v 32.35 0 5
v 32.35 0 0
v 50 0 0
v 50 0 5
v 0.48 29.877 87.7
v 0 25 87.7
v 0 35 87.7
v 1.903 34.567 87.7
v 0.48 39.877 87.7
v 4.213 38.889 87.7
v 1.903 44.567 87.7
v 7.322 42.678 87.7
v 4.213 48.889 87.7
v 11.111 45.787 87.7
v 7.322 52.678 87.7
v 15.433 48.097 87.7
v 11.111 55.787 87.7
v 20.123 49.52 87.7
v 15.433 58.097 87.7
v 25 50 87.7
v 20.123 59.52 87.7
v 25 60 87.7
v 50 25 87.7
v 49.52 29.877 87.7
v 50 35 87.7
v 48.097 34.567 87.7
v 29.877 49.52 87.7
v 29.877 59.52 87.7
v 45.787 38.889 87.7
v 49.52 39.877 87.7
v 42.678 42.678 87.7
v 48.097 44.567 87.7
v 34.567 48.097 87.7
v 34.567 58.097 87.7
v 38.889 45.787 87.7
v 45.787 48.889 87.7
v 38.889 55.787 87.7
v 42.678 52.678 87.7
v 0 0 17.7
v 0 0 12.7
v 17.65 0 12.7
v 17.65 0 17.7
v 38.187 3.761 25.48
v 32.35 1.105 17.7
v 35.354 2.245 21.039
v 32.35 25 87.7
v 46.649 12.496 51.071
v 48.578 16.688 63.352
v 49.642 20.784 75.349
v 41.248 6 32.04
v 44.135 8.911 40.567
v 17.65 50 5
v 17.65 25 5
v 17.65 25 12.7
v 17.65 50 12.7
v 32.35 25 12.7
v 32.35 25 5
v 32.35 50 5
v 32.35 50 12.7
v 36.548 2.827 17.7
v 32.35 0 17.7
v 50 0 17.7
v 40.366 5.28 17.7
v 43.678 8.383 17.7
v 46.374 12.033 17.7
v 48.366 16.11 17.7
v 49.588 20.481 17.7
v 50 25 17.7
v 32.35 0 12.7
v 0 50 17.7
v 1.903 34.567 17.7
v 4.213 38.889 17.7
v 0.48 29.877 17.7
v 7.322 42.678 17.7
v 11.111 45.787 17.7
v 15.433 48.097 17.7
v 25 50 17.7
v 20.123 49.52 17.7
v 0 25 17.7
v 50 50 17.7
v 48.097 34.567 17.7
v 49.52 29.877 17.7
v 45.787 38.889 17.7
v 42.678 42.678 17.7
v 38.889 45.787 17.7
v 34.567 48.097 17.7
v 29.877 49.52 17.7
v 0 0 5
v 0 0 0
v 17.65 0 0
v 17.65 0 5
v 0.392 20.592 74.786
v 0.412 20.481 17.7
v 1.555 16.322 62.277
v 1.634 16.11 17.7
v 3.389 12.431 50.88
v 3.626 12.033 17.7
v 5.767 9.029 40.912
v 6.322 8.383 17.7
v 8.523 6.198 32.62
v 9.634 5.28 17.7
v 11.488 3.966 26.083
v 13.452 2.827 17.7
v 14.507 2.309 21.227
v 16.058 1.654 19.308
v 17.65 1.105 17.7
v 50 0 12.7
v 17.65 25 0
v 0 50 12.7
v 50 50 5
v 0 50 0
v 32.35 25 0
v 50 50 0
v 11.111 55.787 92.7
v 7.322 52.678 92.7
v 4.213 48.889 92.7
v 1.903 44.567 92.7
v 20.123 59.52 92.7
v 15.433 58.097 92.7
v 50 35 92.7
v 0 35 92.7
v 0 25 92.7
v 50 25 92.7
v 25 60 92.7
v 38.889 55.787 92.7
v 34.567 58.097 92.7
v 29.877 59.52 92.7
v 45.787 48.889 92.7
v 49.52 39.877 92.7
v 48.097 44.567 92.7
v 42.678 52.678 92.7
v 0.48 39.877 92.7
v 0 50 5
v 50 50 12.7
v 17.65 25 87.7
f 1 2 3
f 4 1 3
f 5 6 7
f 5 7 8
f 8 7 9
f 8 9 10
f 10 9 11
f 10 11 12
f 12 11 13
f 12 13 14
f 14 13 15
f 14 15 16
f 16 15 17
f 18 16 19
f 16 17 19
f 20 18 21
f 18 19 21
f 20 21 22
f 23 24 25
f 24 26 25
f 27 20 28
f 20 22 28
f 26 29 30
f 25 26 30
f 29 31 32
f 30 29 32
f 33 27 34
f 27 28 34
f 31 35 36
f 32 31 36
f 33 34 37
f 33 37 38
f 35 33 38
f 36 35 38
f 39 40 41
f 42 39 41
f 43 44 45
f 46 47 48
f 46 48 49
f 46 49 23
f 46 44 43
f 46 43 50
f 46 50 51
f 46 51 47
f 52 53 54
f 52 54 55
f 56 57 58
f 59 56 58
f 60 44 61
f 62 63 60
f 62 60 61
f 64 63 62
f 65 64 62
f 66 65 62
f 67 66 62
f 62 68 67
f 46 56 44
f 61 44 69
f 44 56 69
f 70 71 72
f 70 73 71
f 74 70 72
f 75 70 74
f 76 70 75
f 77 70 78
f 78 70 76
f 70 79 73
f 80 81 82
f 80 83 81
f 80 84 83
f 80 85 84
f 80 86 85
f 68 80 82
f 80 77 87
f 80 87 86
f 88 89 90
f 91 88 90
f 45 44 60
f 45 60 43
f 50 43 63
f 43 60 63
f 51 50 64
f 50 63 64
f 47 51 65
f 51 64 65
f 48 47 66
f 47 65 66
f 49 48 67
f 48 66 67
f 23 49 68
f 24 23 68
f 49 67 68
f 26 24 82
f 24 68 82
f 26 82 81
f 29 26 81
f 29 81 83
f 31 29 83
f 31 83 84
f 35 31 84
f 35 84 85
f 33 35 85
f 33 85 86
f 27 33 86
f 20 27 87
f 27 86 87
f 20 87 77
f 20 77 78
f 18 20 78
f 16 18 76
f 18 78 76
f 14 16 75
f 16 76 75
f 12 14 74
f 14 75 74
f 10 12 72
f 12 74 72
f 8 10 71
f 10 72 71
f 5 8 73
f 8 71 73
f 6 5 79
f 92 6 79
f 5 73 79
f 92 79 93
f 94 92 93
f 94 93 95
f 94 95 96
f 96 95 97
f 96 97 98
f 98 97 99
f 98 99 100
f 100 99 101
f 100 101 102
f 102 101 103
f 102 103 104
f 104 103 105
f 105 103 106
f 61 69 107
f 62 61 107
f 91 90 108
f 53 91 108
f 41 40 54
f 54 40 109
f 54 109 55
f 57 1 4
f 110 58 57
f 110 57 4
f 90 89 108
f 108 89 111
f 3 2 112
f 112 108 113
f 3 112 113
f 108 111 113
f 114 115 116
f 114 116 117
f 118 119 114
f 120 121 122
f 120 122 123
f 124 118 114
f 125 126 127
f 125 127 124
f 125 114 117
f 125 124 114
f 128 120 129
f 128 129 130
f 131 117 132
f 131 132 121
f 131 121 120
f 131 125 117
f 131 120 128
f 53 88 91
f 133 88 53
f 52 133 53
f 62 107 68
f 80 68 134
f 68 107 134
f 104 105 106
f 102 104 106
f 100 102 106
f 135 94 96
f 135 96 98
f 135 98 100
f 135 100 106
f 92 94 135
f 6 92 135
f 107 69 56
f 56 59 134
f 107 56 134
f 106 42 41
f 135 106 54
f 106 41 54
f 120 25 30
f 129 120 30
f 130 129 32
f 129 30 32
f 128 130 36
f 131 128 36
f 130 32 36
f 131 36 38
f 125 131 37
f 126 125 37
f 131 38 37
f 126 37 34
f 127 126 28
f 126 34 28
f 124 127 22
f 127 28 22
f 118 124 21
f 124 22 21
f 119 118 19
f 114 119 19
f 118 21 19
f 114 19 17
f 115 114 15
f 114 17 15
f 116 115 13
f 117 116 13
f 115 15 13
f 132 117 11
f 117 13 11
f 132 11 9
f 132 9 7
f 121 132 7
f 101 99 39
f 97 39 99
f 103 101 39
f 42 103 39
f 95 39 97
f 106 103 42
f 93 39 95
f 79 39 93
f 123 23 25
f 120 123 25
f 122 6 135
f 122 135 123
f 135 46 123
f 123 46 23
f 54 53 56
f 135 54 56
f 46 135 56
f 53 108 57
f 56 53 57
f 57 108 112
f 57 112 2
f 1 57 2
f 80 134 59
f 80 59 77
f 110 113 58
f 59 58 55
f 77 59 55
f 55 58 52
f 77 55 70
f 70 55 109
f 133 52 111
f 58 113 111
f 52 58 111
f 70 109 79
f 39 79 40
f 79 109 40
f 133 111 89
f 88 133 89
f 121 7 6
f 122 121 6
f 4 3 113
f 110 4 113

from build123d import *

# Parameters (mm, degrees)
F2_DEPTH  = 5
F3_W      = 14.7
F3_H      = 25
F4_DEPTH  = 7.7
F6_DEPTH  = 5
F8_DEPTH  = 70
F10_DEPTH = 5
F12_DEPTH = 50.001


with BuildPart() as f2:
    # F1 (on Top) → F2 (new body)
    with BuildSketch(Plane.XY):
        Polygon((0, 50), (0, 0), (17.65, 0), (17.65, 25), (32.35, 25), (32.35, 0), (50, 0), (50, 50), align=None)
    extrude(amount=F2_DEPTH)

    # F3 (on face) → F4 (join)
    with BuildSketch(Plane.XY.offset(5)):
        with Locations((25, 37.5)):
            Rectangle(F3_W, F3_H)
    extrude(amount=F4_DEPTH)

    # F5 (on face) → F6 (join)
    with BuildSketch(Plane.XY.offset(12.7)):
        Polygon((0, 50), (0, 0), (17.65, 0), (17.65, 25), (32.35, 25), (32.35, 0), (50, 0), (50, 50), align=None)
    extrude(amount=F6_DEPTH)

    # F7 (on face) → F8 (join)
    with BuildSketch(Plane.XY.offset(17.7)):
        with BuildLine():
            Line((32.35, 25), (32.35, 1.104865))
            ThreePointArc((32.35, 1.104865), (25, 50), (17.65, 1.104865))
            Line((17.65, 1.104865), (17.65, 25))
            Line((17.65, 25), (32.35, 25))
        make_face()
    extrude(amount=F8_DEPTH)

    # F9 (on face) → F10 (join)
    with BuildSketch(Plane.XY.offset(87.7)):
        with BuildLine():
            Line((0, 35), (0, 25))
            Line((0, 25), (50, 25))
            Line((50, 25), (50, 35))
            ThreePointArc((50, 35), (25, 60), (0, 35))
        make_face()
    extrude(amount=F10_DEPTH)

    # F11 (on Right) → F12 (cut, through all)
    with BuildSketch(Plane.YZ):
        Polygon((1.104865, 17.7), (25, 87.7), (1.104865, 87.7), align=None)
    extrude(amount=F12_DEPTH, mode=Mode.SUBTRACT)


solid = f2.part
